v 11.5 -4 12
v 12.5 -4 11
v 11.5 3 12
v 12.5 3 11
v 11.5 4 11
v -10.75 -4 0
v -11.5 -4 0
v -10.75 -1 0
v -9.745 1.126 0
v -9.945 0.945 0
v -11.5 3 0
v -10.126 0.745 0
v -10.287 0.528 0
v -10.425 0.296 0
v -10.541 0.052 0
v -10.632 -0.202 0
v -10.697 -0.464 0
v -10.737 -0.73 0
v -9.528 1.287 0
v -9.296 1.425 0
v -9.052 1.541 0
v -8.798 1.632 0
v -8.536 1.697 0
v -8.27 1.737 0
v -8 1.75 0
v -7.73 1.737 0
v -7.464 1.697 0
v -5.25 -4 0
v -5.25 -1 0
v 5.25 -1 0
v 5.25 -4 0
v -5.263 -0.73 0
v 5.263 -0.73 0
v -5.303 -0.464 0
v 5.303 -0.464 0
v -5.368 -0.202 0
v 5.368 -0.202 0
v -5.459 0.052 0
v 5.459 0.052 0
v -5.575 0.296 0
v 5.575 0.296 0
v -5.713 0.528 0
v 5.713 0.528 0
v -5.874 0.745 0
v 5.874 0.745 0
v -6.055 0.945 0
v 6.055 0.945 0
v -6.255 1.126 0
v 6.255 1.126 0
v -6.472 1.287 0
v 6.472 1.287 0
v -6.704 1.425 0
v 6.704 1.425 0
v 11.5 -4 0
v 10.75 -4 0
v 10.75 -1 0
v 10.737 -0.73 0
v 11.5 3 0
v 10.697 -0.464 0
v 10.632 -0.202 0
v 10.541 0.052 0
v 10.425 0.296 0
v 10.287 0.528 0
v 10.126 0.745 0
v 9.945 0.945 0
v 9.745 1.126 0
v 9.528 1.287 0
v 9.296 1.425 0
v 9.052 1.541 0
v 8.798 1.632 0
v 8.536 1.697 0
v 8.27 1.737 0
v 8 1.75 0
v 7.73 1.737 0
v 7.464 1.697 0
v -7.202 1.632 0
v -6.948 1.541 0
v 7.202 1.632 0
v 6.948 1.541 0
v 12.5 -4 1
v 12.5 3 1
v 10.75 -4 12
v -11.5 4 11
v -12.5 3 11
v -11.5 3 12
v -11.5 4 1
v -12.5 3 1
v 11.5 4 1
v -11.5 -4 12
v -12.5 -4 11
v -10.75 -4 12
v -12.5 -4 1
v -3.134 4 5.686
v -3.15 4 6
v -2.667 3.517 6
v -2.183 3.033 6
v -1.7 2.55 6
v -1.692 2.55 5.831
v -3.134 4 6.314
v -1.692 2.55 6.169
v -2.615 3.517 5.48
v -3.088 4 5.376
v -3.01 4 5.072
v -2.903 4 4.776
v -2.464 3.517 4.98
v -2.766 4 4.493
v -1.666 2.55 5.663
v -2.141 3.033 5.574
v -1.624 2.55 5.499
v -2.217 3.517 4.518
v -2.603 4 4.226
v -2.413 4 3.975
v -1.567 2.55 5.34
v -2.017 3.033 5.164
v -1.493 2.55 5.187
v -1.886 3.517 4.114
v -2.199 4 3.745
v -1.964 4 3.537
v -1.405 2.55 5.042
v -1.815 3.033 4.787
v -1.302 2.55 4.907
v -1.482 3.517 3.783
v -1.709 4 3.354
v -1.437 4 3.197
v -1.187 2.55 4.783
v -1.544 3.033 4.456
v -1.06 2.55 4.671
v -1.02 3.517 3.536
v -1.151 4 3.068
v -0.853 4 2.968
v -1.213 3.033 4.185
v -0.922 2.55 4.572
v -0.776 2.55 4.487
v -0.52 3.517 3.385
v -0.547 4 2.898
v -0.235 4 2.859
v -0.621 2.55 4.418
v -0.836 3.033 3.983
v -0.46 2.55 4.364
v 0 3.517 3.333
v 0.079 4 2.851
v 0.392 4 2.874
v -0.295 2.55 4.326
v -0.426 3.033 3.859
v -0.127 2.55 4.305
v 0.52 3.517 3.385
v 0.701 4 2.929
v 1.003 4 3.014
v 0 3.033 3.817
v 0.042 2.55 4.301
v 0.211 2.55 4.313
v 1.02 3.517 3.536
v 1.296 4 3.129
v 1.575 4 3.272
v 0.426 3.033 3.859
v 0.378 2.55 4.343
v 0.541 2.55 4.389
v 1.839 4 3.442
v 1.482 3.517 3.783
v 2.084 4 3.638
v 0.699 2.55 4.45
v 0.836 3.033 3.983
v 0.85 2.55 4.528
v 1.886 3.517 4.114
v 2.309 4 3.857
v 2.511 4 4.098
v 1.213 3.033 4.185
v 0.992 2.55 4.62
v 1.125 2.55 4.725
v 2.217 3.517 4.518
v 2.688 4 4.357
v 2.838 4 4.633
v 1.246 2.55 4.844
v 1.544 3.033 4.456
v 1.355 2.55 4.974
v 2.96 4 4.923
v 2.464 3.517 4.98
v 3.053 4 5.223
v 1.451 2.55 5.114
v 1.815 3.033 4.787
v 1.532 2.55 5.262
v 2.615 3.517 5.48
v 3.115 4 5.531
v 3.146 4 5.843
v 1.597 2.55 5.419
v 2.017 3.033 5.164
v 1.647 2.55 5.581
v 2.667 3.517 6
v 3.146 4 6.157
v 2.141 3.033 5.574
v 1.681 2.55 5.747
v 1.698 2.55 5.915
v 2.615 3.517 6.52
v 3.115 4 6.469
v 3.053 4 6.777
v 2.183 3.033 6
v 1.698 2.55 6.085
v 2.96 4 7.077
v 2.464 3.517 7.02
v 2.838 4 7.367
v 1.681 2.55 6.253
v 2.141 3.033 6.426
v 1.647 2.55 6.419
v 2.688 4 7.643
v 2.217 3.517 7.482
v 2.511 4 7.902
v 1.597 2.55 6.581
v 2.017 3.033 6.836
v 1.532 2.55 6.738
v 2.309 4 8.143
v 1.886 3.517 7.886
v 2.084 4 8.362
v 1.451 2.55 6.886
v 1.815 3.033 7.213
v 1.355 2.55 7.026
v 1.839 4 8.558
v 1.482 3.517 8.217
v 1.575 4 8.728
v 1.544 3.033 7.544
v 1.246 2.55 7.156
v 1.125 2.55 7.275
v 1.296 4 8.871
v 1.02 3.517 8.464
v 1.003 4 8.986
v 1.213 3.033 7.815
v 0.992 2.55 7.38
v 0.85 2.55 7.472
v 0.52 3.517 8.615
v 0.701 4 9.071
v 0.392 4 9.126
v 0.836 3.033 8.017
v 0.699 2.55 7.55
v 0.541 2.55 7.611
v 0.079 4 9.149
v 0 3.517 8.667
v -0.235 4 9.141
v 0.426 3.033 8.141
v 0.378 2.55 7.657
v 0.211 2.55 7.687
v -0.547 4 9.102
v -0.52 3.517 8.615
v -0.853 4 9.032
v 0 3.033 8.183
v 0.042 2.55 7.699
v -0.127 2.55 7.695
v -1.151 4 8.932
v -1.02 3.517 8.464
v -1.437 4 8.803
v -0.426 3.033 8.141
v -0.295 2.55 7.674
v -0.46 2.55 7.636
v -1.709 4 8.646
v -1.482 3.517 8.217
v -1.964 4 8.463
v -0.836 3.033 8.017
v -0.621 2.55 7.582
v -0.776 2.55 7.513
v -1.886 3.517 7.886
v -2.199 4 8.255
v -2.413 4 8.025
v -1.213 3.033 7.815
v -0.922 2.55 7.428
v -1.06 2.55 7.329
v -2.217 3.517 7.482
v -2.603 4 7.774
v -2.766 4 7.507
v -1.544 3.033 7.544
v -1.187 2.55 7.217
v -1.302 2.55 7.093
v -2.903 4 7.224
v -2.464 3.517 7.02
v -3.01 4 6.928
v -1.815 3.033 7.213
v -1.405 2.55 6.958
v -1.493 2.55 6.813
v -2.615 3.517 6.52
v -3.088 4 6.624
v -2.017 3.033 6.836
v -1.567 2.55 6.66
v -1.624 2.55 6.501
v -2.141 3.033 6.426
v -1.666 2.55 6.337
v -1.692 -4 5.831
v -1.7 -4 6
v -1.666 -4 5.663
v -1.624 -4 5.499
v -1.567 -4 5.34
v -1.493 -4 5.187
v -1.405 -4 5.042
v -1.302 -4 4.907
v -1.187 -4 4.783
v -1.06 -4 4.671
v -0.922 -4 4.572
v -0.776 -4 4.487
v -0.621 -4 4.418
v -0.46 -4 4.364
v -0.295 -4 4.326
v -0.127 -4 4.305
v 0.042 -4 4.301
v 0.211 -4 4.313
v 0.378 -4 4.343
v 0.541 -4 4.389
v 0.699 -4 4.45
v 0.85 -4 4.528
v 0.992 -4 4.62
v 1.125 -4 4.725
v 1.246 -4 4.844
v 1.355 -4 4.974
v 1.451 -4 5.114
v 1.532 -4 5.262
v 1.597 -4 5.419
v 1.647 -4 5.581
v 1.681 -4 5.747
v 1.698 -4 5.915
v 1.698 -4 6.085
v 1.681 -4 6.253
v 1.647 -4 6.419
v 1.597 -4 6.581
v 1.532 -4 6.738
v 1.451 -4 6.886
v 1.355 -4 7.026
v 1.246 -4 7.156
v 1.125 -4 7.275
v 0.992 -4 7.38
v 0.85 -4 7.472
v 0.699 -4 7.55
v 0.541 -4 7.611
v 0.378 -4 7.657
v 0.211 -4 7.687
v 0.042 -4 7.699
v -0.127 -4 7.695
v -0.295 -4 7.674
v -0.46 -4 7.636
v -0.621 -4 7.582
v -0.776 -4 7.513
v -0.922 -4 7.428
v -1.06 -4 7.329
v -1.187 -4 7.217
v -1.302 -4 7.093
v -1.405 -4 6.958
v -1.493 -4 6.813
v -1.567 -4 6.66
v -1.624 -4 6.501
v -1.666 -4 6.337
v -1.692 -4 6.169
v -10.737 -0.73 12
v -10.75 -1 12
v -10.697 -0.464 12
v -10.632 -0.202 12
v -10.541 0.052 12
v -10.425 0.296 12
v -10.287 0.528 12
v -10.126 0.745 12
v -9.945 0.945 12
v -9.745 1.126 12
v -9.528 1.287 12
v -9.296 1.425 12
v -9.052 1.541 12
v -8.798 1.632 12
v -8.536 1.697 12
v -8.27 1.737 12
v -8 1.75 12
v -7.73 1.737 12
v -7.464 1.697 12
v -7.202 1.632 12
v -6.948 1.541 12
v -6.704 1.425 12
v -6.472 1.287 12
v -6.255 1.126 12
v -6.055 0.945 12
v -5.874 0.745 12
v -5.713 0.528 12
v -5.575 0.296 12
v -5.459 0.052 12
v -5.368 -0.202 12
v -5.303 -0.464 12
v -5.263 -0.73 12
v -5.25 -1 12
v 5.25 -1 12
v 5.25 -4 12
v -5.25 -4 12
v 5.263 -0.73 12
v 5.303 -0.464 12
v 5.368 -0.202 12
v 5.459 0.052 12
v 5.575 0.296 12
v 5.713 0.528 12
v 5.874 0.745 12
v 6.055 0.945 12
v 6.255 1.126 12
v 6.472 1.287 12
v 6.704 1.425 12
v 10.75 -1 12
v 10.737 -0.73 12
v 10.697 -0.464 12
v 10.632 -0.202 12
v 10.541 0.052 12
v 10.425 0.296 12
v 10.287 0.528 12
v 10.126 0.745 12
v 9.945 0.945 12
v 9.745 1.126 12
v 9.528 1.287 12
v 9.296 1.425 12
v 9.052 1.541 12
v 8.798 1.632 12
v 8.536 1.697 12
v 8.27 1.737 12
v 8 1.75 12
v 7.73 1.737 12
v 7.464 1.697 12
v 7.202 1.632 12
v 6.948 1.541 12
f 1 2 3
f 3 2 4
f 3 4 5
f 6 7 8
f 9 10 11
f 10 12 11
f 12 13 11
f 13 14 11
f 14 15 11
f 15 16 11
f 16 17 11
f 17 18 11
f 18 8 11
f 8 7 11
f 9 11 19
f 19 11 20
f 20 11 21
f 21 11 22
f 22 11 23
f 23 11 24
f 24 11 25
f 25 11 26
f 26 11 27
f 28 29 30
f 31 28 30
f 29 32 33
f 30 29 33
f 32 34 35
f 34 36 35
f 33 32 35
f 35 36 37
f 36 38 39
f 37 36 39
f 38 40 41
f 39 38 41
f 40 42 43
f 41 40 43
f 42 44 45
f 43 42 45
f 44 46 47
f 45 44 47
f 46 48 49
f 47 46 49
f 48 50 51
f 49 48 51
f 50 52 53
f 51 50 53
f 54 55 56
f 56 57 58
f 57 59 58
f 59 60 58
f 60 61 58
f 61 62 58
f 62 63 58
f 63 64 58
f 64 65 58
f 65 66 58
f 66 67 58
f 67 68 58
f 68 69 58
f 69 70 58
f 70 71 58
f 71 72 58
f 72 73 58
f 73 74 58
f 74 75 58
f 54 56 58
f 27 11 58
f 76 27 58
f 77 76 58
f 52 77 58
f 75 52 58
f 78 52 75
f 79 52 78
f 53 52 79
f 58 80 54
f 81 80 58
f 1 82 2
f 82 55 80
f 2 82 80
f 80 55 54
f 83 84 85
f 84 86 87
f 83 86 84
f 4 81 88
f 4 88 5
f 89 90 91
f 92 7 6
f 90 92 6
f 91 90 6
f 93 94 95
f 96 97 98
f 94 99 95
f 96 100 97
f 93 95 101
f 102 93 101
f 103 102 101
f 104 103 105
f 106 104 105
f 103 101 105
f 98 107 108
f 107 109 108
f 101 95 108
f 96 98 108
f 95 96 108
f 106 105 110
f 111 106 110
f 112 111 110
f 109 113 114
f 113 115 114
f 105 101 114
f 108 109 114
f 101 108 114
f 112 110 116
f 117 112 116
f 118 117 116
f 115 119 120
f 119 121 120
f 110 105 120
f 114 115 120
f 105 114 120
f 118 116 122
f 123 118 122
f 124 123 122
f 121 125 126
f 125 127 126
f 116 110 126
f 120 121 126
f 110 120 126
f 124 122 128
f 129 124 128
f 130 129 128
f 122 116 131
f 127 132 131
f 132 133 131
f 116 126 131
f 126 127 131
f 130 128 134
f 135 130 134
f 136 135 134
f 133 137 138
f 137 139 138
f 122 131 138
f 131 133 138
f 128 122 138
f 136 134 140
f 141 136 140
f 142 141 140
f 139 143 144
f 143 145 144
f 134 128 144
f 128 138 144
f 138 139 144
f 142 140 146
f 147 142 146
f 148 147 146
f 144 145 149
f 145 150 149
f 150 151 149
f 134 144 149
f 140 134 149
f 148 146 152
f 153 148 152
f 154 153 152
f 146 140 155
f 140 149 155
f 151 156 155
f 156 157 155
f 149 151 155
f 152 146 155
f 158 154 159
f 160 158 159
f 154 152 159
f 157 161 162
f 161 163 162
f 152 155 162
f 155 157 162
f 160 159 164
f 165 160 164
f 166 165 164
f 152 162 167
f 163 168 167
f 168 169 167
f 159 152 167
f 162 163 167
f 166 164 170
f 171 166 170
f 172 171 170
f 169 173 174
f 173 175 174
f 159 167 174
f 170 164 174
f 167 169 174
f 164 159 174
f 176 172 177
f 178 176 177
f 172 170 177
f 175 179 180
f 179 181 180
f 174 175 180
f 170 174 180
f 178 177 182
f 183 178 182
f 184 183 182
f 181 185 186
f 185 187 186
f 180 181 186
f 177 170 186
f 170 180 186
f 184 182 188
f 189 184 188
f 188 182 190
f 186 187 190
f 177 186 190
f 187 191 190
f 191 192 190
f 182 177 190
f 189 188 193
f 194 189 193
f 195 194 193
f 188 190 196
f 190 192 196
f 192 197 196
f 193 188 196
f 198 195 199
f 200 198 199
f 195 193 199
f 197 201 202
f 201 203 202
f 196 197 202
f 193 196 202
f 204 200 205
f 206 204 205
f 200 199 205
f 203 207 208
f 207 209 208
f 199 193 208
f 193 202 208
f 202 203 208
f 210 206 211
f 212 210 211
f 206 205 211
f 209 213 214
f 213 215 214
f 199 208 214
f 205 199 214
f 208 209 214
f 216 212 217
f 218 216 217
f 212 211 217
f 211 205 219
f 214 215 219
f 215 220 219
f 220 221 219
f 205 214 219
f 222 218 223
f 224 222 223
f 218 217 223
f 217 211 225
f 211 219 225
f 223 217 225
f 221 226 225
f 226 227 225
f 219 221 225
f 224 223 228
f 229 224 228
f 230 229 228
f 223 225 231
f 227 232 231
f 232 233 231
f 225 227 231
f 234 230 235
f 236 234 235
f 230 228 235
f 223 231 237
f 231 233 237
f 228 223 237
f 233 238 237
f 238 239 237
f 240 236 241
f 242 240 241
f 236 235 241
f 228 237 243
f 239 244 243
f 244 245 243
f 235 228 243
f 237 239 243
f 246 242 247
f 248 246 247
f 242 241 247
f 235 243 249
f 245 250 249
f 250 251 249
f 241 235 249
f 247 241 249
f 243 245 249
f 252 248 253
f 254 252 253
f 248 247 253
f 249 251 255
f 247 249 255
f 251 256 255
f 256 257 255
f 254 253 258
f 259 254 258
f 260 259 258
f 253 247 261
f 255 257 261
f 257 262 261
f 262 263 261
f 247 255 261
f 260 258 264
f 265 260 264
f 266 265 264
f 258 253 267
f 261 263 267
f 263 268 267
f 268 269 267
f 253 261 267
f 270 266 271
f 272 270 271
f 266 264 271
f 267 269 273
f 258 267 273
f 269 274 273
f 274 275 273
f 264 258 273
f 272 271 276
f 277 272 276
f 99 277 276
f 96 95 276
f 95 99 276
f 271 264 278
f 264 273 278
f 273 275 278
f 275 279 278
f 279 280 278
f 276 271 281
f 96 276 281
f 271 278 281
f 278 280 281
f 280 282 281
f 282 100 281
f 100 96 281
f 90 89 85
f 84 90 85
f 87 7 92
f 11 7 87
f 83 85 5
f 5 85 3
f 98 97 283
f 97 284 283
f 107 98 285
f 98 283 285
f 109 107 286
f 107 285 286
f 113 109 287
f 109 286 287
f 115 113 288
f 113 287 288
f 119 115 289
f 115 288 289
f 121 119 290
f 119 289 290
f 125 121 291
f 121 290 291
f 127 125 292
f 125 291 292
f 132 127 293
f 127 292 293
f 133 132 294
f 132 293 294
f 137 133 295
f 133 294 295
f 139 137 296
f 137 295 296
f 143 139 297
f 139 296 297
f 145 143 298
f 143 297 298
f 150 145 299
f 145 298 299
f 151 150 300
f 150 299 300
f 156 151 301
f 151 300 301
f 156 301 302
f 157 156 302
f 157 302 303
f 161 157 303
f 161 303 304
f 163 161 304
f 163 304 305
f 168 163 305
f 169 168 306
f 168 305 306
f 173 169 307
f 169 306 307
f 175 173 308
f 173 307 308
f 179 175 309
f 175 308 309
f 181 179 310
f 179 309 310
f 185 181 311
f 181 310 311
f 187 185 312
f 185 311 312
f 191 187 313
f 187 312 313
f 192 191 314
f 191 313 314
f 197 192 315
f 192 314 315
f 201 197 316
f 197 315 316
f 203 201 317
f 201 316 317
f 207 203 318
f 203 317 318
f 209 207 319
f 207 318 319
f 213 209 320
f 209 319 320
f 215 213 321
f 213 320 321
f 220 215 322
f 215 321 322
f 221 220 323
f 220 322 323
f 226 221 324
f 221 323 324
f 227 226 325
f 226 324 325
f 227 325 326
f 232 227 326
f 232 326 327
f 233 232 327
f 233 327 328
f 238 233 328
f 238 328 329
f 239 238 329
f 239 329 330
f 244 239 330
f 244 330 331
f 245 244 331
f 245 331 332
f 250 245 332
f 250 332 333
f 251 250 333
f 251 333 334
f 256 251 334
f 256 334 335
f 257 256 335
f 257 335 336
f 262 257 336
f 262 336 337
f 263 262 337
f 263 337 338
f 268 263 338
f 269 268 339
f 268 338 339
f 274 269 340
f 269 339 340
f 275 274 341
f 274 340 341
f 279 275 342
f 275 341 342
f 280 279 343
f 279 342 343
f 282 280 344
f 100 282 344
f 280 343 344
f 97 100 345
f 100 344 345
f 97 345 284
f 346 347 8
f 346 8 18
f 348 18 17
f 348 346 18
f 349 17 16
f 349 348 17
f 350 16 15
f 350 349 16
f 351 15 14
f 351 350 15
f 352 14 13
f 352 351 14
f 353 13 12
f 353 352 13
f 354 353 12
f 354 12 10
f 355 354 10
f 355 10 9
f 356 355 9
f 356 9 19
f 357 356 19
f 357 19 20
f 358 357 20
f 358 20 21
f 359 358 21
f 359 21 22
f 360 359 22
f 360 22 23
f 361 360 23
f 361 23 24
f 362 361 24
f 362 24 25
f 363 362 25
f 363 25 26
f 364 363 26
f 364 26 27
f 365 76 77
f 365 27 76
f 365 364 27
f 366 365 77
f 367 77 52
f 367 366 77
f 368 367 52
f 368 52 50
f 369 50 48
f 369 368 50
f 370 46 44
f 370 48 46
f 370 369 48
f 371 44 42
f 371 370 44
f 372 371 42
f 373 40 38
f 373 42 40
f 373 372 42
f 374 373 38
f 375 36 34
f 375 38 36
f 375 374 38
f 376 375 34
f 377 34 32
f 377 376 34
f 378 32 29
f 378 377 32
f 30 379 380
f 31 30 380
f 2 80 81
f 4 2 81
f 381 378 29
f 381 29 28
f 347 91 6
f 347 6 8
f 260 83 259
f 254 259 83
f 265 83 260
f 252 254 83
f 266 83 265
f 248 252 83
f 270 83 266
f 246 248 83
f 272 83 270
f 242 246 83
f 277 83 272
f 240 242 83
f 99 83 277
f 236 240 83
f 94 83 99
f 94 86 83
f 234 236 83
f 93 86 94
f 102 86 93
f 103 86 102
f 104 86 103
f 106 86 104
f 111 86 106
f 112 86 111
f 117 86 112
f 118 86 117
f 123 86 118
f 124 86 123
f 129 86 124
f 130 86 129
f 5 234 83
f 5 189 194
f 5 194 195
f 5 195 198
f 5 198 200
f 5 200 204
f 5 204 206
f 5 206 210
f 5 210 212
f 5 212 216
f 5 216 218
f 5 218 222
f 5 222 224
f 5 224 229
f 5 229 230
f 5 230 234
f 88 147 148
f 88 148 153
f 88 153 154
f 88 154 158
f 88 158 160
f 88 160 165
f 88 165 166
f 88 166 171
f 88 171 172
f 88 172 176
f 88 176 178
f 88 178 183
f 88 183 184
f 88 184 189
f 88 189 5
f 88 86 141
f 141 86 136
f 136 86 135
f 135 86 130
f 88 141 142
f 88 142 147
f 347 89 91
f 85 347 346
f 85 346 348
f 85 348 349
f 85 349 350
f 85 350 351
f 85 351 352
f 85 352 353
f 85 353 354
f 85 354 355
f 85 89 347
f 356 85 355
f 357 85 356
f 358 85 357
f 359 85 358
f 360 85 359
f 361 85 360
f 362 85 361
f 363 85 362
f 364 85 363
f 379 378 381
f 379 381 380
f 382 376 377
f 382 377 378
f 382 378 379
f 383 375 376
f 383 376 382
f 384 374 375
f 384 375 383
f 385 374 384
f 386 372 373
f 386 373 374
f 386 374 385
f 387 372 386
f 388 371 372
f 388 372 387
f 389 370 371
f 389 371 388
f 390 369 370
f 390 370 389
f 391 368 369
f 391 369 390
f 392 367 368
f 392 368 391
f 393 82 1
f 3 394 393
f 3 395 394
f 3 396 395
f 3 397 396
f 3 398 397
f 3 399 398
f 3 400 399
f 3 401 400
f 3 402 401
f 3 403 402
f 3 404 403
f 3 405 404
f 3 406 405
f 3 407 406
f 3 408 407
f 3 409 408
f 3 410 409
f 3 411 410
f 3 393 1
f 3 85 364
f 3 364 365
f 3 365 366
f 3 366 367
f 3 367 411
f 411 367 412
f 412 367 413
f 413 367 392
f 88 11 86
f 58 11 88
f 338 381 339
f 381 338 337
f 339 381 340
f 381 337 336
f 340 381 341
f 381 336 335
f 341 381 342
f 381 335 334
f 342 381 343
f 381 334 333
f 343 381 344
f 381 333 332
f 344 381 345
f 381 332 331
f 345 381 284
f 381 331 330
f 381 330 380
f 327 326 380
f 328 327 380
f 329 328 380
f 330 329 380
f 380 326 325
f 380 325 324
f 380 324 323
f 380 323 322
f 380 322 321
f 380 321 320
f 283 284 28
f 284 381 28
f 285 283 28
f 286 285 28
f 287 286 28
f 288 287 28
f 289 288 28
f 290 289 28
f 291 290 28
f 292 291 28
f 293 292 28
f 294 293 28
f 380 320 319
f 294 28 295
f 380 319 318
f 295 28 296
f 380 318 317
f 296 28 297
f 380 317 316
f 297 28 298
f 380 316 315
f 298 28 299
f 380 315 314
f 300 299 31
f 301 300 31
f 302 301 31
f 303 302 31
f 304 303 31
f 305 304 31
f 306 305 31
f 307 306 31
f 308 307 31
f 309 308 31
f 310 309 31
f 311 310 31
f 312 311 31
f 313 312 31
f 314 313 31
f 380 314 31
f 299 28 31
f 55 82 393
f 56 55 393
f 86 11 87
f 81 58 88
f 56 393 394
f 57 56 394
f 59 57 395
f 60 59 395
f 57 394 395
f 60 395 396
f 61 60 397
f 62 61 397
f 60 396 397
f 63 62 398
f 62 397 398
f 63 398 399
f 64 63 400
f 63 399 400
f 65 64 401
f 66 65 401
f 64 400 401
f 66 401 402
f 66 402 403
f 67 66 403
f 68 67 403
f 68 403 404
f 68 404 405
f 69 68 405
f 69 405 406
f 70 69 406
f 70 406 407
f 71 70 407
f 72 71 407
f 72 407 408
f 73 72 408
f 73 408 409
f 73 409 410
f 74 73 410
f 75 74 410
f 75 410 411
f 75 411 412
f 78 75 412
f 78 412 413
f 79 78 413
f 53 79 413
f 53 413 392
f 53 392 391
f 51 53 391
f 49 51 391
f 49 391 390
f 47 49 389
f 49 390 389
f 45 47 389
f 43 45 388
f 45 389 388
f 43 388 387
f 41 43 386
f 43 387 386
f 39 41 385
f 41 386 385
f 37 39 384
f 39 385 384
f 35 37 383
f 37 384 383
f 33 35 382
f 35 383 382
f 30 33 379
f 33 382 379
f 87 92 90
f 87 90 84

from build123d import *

# Parameters (mm, degrees)
ESQUISSE1_W                                    = 25
ESQUISSE1_H                                    = 8
BOSS_EXTRU_1_DEPTH                             = 12
FRAISAGE_POUR_VIS_T_TE_FRAIS_E_M31_D           = 3.4
FRAISAGE_POUR_VIS_T_TE_FRAIS_E_M31_CSINK_D     = 6.3
FRAISAGE_POUR_VIS_T_TE_FRAIS_E_M31_CSINK_ANGLE = 90
ENL_V_MAT_EXTRU_1_DEPTH                        = 13
CHANFREIN1_SIZE                                = 1


with BuildPart() as part:
    # Esquisse1 → Boss.-Extru.1 (new body)
    with BuildSketch(Plane.XY):
        Rectangle(ESQUISSE1_W, ESQUISSE1_H)
    extrude(amount=BOSS_EXTRU_1_DEPTH)

    # Fraisage pour vis à tête fraisée M31 (through all)
    with Locations(Plane(origin=(0, 4, 0), x_dir=(1, 0, 0), z_dir=(0, 1, 0))):
        with Locations((0, -6)):
            CounterSinkHole(FRAISAGE_POUR_VIS_T_TE_FRAIS_E_M31_D / 2, FRAISAGE_POUR_VIS_T_TE_FRAIS_E_M31_CSINK_D / 2, counter_sink_angle=FRAISAGE_POUR_VIS_T_TE_FRAIS_E_M31_CSINK_ANGLE)

    # Esquisse4 → Enlèv. mat.-Extru.1 (cut, through all)
    with BuildSketch(Plane.XY.offset(12)):
        with BuildLine():
            Line((-5.25, -1), (-5.25, -4))
            Line((-5.25, -4), (-10.75, -4))
            Line((-10.75, -4), (-10.75, -1))
            ThreePointArc((-10.75, -1), (-8, 1.75), (-5.25, -1))
        make_face()
        with BuildLine():
            Line((5.25, -1), (5.25, -4))
            Line((5.25, -4), (10.75, -4))
            Line((10.75, -4), (10.75, -1))
            ThreePointArc((10.75, -1), (8, 1.75), (5.25, -1))
        make_face()
    extrude(amount=-ENL_V_MAT_EXTRU_1_DEPTH, mode=Mode.SUBTRACT)

    # Chanfrein1
    chanfrein1_edges = [part.edges().sort_by_distance(p)[0] for p in [
        (-12.5, 0, 12),
        (12.5, 0, 12),
        (-12.5, 0, 0),
        (0, 4, 0),
        (12.5, 0, 0),
        (-12.5, 4, 6),
        (12.5, 4, 6),
        (0, 4, 12),
    ]]
    chamfer(chanfrein1_edges, length=CHANFREIN1_SIZE)


solid = part.part
